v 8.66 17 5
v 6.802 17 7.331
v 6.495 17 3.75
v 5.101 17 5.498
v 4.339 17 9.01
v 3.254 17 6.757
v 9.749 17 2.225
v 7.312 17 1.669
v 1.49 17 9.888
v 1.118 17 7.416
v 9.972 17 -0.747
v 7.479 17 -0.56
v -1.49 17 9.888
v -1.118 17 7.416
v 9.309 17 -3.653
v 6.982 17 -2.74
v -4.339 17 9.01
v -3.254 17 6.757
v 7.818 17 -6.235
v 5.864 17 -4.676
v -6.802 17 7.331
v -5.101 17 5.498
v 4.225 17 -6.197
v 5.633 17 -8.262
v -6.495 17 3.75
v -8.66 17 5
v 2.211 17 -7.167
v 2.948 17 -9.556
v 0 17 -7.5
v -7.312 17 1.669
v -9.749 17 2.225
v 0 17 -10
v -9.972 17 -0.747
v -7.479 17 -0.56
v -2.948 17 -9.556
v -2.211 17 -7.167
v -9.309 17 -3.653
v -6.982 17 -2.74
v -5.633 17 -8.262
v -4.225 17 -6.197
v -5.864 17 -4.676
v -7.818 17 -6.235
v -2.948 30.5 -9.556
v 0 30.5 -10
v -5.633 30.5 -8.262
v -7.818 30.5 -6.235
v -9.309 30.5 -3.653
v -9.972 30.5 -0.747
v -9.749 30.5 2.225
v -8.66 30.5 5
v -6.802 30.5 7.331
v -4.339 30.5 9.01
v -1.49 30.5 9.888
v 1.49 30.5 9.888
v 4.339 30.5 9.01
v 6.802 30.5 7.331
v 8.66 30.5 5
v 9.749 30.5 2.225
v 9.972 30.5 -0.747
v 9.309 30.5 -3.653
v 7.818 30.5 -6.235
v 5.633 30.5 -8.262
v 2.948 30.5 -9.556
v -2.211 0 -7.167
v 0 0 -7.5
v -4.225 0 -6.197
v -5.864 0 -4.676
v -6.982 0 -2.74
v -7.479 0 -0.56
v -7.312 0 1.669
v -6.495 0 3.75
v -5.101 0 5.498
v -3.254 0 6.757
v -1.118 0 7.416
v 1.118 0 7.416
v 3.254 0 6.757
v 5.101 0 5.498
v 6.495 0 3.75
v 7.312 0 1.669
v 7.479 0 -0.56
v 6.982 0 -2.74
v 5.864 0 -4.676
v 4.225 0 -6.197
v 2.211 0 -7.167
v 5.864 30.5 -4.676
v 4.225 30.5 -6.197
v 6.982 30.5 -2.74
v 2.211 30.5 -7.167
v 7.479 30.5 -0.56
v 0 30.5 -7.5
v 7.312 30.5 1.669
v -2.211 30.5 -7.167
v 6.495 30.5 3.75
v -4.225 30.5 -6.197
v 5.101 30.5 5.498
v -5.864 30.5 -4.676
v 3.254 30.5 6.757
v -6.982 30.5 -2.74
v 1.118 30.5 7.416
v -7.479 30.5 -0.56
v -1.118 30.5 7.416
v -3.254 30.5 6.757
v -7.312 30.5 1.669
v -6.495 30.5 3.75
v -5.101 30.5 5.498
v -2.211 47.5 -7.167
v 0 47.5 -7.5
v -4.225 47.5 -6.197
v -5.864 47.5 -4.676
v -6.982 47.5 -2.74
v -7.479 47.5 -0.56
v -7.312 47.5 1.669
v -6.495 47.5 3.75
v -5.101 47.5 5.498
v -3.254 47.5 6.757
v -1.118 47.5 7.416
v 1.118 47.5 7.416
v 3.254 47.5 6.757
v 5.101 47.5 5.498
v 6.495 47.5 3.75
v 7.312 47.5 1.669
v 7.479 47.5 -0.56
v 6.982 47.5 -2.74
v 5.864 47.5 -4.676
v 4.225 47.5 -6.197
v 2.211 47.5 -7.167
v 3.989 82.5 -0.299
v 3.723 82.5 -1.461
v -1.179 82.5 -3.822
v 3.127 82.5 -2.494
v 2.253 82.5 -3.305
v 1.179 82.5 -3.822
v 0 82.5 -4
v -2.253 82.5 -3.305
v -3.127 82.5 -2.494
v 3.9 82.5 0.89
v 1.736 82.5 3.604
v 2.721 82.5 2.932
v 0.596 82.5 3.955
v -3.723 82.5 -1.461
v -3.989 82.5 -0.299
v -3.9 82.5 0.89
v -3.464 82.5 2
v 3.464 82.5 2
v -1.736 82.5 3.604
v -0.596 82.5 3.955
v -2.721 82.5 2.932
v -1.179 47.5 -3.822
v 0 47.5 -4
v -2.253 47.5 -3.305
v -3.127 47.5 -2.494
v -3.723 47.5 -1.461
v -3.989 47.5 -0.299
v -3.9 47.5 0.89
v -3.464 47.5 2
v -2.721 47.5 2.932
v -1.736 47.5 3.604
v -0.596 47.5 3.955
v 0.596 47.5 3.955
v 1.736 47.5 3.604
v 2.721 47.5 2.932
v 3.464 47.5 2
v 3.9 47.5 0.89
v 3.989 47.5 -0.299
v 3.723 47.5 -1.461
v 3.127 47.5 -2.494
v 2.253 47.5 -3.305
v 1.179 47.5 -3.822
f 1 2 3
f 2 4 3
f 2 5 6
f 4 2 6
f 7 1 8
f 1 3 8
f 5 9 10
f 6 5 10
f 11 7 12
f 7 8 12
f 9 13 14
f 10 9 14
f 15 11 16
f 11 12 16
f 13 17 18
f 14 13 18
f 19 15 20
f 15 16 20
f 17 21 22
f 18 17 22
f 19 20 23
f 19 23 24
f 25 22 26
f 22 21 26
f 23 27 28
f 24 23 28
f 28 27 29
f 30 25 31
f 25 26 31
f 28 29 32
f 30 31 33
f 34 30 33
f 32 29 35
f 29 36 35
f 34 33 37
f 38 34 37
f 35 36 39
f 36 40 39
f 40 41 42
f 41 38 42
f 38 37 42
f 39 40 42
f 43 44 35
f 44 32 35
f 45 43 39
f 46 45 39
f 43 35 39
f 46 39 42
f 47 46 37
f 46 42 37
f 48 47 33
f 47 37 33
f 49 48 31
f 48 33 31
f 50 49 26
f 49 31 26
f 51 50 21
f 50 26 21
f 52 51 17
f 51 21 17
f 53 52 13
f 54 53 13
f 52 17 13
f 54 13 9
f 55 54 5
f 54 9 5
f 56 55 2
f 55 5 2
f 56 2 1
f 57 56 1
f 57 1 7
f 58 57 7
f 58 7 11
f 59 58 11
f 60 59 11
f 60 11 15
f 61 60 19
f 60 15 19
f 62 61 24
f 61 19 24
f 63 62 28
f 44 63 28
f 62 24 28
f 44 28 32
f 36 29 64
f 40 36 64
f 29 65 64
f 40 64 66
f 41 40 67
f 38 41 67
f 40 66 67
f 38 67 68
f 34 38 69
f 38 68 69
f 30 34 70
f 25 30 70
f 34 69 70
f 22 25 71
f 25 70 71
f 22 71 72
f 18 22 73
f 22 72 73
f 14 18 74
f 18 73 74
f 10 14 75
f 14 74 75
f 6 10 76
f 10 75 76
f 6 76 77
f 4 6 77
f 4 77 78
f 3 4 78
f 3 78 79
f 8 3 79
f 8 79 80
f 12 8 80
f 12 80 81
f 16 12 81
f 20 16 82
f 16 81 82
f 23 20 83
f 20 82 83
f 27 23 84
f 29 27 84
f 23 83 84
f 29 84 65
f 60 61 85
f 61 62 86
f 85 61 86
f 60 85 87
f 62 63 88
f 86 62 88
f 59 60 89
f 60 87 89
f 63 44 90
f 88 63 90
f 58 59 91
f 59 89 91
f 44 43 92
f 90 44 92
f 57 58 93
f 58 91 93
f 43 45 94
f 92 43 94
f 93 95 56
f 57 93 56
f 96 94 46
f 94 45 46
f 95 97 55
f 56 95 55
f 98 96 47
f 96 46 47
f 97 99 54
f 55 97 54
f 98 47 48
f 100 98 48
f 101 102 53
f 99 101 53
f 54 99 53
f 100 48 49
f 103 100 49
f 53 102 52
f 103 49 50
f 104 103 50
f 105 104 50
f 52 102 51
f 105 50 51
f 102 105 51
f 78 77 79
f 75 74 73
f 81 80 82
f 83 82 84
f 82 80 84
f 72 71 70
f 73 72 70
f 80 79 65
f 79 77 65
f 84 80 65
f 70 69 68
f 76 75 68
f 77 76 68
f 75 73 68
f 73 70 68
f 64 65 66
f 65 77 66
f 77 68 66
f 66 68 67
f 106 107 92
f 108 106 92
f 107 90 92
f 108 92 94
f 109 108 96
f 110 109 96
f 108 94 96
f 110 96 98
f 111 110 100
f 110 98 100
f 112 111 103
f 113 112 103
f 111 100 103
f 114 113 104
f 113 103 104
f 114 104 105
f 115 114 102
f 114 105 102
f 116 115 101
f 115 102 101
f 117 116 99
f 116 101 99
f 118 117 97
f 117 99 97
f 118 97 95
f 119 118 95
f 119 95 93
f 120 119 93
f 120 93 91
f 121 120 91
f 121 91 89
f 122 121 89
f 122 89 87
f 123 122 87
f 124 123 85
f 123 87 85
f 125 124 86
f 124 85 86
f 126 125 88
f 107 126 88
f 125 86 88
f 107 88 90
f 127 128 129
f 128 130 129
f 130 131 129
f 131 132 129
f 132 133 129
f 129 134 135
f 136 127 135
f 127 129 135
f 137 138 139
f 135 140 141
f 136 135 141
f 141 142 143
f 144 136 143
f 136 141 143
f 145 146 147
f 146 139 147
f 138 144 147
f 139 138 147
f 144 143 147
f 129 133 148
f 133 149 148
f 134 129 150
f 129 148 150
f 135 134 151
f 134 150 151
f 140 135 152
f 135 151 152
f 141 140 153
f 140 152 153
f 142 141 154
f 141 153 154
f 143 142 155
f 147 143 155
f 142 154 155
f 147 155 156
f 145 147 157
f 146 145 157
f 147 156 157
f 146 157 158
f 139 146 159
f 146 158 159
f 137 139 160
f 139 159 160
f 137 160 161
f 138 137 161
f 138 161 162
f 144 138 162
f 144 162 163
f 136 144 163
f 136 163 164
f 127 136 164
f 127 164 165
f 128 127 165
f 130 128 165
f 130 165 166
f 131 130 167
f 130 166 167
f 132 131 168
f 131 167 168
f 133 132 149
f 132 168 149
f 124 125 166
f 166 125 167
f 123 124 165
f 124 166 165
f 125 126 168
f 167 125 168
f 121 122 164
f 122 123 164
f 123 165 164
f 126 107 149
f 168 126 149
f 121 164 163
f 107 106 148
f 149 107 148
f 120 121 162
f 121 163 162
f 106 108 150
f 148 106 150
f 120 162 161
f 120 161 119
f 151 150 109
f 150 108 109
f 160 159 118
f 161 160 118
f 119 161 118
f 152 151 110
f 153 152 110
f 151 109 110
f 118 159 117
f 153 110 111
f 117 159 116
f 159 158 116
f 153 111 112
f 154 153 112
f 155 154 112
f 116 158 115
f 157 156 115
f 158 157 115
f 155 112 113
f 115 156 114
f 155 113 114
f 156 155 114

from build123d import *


with BuildPart() as part:
    # Szkic1 → Obrót1 (revolve)
    with BuildSketch(Plane.XY, mode=Mode.PRIVATE) as obr_t1_sk:
        Polygon((4, 47.5), (7.5, 47.5), (7.5, 30.5), (10, 30.5), (10, 17), (7.5, 17), (7.5, 0), (0, 0), (0, 47.5), (0, 82.5), (4, 82.5), align=None)
    revolve(obr_t1_sk.sketch.rotate(Axis((0, 0, 0), (0, 1, 0)), 90), axis=Axis((0, 0, 0), (0, 1, 0)))


solid = part.part
